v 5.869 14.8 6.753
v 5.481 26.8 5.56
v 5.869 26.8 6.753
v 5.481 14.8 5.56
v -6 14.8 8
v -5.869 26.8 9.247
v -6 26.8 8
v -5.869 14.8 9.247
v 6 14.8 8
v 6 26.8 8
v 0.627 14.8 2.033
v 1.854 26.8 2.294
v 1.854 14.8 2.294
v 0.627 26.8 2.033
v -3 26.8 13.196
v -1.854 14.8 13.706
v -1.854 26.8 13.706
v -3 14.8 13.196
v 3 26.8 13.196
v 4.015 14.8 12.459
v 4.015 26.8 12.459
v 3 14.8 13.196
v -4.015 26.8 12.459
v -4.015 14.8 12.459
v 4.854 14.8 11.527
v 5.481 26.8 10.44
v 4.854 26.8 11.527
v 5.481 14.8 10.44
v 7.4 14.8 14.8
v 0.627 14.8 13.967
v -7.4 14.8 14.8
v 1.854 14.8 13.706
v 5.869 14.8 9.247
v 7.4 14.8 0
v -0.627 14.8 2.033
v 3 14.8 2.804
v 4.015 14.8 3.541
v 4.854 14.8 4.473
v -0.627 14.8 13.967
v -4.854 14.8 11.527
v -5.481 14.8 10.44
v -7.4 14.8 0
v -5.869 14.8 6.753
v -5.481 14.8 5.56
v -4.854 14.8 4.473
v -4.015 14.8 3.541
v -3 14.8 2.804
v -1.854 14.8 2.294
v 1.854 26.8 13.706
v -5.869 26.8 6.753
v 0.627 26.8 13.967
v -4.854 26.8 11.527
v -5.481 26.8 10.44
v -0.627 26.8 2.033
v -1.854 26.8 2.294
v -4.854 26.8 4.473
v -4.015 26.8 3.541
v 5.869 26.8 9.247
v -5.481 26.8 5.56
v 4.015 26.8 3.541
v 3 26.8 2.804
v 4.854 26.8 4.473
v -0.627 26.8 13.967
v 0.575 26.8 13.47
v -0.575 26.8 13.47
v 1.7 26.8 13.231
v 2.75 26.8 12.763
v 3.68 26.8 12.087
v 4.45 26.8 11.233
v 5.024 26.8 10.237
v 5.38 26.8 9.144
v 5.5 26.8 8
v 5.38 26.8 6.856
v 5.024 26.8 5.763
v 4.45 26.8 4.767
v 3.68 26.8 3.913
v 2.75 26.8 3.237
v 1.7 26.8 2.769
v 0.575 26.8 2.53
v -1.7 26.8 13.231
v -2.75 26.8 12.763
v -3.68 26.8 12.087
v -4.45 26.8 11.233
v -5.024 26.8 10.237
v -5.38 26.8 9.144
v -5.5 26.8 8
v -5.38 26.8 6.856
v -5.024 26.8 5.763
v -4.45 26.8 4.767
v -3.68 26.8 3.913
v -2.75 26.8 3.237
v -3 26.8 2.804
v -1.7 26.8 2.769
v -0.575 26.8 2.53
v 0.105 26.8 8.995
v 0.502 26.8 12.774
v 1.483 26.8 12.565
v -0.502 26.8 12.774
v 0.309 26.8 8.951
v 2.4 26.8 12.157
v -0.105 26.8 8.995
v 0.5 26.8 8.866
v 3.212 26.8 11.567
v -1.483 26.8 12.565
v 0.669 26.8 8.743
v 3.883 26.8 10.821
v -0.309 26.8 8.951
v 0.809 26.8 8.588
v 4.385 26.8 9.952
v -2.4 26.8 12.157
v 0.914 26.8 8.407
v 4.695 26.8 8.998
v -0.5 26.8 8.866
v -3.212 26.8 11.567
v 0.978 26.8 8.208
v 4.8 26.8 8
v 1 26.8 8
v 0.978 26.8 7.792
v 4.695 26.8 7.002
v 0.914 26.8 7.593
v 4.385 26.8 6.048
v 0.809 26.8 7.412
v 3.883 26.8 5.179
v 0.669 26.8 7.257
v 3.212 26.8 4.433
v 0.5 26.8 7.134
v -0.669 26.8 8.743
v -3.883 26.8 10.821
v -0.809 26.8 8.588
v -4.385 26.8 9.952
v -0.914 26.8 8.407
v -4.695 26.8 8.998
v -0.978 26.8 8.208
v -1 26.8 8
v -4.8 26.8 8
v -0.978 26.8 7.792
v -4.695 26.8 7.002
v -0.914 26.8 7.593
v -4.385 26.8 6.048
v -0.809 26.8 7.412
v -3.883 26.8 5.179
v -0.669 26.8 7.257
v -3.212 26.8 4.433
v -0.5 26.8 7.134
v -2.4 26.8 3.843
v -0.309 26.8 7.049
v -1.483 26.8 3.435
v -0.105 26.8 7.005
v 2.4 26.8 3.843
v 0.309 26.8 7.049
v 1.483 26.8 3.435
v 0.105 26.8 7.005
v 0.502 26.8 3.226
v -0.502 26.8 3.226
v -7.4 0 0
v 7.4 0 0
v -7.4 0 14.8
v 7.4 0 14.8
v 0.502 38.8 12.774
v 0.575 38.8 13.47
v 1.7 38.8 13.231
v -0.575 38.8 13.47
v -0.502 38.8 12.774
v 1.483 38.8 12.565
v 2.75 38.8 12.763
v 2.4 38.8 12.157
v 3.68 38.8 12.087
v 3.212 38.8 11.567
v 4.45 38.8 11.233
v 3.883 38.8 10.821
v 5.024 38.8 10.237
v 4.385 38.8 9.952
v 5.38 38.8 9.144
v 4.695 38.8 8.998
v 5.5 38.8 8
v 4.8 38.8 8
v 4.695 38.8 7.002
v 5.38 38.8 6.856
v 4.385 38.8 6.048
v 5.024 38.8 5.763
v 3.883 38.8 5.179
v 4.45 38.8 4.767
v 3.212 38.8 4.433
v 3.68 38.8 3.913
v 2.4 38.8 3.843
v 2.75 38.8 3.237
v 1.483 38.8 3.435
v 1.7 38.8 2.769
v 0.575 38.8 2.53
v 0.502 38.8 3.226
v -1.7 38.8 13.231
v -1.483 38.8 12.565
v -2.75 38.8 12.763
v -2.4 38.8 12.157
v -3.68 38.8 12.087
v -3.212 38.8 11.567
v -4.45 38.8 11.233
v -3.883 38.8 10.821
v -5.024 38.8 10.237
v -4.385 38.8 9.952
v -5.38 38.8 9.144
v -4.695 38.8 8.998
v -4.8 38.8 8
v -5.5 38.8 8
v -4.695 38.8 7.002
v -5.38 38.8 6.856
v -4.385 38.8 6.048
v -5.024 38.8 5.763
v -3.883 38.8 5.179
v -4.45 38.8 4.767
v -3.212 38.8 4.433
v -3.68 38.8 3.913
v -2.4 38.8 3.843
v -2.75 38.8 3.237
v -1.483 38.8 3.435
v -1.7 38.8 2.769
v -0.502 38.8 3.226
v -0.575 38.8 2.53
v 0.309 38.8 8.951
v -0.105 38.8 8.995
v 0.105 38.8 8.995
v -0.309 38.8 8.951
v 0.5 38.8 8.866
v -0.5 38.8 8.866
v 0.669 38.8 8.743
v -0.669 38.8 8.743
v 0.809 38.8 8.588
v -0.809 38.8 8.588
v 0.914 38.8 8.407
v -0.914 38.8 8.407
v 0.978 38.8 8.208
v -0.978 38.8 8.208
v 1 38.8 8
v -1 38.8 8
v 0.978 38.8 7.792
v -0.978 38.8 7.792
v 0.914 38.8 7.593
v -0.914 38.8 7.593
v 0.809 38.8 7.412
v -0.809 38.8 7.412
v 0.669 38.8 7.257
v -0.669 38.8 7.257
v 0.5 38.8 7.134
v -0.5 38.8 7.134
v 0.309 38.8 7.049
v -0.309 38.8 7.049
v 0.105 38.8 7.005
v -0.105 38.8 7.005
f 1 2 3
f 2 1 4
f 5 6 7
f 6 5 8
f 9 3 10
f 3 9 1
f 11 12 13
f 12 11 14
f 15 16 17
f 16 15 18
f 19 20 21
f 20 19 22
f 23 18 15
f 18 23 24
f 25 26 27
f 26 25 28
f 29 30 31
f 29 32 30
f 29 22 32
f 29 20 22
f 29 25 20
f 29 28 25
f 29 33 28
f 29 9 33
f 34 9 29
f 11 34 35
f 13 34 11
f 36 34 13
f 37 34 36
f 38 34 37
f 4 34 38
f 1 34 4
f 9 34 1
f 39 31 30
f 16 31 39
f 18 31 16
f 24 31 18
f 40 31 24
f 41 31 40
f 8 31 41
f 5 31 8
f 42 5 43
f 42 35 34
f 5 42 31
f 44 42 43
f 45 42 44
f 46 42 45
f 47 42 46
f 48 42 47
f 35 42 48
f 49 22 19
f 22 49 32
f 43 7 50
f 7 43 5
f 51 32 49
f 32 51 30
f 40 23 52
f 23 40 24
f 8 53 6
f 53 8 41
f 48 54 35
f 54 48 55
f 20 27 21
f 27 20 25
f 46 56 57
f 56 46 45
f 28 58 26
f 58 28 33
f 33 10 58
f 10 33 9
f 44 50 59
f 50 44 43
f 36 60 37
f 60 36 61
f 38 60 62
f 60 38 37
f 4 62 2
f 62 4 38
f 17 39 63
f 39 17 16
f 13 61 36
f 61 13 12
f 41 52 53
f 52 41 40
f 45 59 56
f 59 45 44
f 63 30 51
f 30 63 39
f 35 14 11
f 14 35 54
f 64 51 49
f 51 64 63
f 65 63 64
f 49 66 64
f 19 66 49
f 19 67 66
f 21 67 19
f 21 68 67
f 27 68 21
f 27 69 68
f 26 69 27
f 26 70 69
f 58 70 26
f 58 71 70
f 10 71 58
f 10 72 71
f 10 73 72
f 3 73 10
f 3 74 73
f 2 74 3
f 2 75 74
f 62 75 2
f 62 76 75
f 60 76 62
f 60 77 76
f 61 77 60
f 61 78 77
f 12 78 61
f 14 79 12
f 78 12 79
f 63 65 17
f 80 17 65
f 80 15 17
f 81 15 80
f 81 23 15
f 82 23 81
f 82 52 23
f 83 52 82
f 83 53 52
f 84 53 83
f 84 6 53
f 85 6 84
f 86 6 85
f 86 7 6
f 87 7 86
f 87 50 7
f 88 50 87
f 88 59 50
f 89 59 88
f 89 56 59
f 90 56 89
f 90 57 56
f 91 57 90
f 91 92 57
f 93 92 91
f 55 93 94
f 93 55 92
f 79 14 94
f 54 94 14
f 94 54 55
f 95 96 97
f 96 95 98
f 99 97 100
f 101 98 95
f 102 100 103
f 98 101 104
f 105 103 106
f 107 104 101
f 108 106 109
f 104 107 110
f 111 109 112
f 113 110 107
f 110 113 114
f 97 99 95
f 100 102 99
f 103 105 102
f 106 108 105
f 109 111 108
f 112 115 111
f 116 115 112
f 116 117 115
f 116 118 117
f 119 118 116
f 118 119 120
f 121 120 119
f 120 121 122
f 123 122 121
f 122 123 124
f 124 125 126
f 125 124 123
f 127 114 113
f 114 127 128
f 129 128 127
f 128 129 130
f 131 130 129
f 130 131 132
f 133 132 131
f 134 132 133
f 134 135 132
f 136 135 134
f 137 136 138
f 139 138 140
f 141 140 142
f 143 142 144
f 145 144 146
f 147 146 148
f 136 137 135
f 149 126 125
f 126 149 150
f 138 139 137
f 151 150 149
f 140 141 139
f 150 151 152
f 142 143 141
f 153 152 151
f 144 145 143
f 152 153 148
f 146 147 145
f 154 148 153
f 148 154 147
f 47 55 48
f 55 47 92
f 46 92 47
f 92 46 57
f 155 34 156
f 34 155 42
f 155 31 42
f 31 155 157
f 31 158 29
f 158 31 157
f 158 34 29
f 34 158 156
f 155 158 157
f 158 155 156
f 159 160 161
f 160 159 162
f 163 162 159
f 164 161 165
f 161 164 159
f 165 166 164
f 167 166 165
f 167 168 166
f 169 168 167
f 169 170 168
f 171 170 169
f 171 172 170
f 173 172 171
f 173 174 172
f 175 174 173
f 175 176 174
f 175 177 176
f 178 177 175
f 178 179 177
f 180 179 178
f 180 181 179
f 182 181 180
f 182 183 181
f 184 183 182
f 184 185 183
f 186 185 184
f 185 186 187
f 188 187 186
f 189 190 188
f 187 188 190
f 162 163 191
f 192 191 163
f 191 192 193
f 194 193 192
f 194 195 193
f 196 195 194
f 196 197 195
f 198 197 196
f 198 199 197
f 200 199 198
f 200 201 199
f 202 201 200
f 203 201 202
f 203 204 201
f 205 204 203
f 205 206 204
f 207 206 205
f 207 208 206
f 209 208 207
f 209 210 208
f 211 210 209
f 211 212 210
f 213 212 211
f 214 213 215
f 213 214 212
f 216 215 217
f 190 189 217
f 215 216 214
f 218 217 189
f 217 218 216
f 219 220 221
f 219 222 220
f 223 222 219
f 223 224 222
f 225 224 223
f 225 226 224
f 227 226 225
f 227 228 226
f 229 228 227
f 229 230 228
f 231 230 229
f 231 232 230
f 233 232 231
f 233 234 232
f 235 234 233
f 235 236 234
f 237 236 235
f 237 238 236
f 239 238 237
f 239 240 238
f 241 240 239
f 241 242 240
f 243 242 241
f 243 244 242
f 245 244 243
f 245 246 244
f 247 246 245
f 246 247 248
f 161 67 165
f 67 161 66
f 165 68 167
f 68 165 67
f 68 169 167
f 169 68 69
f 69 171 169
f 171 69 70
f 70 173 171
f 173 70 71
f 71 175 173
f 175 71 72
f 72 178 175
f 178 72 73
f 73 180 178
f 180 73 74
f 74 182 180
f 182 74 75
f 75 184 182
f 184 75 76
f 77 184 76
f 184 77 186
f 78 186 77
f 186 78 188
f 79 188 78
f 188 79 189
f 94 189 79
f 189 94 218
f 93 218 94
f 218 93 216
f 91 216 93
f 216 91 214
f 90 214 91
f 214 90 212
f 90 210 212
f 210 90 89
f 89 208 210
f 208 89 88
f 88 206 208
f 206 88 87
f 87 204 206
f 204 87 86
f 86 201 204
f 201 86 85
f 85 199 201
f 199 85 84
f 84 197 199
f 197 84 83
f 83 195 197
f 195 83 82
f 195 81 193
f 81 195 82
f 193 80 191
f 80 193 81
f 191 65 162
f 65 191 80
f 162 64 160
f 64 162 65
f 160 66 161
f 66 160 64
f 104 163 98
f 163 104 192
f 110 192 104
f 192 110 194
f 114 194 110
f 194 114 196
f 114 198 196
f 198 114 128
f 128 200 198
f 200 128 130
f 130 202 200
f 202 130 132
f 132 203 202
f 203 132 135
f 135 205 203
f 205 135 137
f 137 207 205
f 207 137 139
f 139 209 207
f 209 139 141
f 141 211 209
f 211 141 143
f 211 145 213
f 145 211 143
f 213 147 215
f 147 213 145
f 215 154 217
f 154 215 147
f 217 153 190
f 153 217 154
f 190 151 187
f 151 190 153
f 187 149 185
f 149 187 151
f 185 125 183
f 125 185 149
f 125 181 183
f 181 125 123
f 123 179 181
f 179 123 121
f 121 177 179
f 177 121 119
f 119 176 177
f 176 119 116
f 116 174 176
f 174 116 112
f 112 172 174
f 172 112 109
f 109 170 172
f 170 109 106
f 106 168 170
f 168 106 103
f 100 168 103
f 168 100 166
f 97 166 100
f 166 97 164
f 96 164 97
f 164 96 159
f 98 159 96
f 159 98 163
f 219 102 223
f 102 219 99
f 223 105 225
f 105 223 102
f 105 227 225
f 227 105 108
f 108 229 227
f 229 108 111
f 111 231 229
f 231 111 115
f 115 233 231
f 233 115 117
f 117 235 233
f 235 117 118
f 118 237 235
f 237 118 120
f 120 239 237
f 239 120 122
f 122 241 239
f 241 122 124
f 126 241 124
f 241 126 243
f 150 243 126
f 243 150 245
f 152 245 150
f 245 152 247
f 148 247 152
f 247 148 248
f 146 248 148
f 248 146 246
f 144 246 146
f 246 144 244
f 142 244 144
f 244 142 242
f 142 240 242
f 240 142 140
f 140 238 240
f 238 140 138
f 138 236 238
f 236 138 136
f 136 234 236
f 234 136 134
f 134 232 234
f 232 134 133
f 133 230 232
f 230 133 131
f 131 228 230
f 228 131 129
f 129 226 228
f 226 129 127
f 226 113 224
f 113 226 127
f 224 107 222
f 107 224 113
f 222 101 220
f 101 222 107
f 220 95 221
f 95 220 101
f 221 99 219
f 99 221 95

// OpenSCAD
// TODO correct values

CHASSIS_X_LENGTH = 14.8;
CHASSIS_Y_LENGTH = 14.8;
CHASSIS_Z_LENGTH = 14.8;

SOKET_OUTER_RADIUS = 11.0/2;
SOKET_INNER_RADIUS = 9.6/2;
SOCKET_LENGTH = 12;

SCREW_RADIUS = 6;
SCREW_LENGTH=10;

// Increase steps in render to have quality circles
$fs=0.01;

module Socket(){

translate([0,0,SOKET_OUTER_RADIUS])
    rotate([270, 0])
        linear_extrude(height = SOCKET_LENGTH, convexity = 10, twist = 0)
            union() {
                difference() {
                    circle(SOKET_OUTER_RADIUS);
                    circle(SOKET_INNER_RADIUS);
                }

                circle(1);
            }
}

module Screw() {
    translate([0,0,SCREW_RADIUS])
        rotate([270, 0])
            linear_extrude(height = SOCKET_LENGTH, convexity = 10, twist = 0)
                circle(SCREW_RADIUS);
}

module Chassis() {
    translate([-CHASSIS_Z_LENGTH/2,0,0])
    linear_extrude(height = CHASSIS_Z_LENGTH, convexity = 10, twist = 0)
        square([CHASSIS_X_LENGTH,CHASSIS_Y_LENGTH]);
}

union () {
    translate([0,CHASSIS_Z_LENGTH,2])

    Screw();
    Chassis();

    translate([0,SOCKET_LENGTH+CHASSIS_Z_LENGTH,2.5])
        Socket();
}
